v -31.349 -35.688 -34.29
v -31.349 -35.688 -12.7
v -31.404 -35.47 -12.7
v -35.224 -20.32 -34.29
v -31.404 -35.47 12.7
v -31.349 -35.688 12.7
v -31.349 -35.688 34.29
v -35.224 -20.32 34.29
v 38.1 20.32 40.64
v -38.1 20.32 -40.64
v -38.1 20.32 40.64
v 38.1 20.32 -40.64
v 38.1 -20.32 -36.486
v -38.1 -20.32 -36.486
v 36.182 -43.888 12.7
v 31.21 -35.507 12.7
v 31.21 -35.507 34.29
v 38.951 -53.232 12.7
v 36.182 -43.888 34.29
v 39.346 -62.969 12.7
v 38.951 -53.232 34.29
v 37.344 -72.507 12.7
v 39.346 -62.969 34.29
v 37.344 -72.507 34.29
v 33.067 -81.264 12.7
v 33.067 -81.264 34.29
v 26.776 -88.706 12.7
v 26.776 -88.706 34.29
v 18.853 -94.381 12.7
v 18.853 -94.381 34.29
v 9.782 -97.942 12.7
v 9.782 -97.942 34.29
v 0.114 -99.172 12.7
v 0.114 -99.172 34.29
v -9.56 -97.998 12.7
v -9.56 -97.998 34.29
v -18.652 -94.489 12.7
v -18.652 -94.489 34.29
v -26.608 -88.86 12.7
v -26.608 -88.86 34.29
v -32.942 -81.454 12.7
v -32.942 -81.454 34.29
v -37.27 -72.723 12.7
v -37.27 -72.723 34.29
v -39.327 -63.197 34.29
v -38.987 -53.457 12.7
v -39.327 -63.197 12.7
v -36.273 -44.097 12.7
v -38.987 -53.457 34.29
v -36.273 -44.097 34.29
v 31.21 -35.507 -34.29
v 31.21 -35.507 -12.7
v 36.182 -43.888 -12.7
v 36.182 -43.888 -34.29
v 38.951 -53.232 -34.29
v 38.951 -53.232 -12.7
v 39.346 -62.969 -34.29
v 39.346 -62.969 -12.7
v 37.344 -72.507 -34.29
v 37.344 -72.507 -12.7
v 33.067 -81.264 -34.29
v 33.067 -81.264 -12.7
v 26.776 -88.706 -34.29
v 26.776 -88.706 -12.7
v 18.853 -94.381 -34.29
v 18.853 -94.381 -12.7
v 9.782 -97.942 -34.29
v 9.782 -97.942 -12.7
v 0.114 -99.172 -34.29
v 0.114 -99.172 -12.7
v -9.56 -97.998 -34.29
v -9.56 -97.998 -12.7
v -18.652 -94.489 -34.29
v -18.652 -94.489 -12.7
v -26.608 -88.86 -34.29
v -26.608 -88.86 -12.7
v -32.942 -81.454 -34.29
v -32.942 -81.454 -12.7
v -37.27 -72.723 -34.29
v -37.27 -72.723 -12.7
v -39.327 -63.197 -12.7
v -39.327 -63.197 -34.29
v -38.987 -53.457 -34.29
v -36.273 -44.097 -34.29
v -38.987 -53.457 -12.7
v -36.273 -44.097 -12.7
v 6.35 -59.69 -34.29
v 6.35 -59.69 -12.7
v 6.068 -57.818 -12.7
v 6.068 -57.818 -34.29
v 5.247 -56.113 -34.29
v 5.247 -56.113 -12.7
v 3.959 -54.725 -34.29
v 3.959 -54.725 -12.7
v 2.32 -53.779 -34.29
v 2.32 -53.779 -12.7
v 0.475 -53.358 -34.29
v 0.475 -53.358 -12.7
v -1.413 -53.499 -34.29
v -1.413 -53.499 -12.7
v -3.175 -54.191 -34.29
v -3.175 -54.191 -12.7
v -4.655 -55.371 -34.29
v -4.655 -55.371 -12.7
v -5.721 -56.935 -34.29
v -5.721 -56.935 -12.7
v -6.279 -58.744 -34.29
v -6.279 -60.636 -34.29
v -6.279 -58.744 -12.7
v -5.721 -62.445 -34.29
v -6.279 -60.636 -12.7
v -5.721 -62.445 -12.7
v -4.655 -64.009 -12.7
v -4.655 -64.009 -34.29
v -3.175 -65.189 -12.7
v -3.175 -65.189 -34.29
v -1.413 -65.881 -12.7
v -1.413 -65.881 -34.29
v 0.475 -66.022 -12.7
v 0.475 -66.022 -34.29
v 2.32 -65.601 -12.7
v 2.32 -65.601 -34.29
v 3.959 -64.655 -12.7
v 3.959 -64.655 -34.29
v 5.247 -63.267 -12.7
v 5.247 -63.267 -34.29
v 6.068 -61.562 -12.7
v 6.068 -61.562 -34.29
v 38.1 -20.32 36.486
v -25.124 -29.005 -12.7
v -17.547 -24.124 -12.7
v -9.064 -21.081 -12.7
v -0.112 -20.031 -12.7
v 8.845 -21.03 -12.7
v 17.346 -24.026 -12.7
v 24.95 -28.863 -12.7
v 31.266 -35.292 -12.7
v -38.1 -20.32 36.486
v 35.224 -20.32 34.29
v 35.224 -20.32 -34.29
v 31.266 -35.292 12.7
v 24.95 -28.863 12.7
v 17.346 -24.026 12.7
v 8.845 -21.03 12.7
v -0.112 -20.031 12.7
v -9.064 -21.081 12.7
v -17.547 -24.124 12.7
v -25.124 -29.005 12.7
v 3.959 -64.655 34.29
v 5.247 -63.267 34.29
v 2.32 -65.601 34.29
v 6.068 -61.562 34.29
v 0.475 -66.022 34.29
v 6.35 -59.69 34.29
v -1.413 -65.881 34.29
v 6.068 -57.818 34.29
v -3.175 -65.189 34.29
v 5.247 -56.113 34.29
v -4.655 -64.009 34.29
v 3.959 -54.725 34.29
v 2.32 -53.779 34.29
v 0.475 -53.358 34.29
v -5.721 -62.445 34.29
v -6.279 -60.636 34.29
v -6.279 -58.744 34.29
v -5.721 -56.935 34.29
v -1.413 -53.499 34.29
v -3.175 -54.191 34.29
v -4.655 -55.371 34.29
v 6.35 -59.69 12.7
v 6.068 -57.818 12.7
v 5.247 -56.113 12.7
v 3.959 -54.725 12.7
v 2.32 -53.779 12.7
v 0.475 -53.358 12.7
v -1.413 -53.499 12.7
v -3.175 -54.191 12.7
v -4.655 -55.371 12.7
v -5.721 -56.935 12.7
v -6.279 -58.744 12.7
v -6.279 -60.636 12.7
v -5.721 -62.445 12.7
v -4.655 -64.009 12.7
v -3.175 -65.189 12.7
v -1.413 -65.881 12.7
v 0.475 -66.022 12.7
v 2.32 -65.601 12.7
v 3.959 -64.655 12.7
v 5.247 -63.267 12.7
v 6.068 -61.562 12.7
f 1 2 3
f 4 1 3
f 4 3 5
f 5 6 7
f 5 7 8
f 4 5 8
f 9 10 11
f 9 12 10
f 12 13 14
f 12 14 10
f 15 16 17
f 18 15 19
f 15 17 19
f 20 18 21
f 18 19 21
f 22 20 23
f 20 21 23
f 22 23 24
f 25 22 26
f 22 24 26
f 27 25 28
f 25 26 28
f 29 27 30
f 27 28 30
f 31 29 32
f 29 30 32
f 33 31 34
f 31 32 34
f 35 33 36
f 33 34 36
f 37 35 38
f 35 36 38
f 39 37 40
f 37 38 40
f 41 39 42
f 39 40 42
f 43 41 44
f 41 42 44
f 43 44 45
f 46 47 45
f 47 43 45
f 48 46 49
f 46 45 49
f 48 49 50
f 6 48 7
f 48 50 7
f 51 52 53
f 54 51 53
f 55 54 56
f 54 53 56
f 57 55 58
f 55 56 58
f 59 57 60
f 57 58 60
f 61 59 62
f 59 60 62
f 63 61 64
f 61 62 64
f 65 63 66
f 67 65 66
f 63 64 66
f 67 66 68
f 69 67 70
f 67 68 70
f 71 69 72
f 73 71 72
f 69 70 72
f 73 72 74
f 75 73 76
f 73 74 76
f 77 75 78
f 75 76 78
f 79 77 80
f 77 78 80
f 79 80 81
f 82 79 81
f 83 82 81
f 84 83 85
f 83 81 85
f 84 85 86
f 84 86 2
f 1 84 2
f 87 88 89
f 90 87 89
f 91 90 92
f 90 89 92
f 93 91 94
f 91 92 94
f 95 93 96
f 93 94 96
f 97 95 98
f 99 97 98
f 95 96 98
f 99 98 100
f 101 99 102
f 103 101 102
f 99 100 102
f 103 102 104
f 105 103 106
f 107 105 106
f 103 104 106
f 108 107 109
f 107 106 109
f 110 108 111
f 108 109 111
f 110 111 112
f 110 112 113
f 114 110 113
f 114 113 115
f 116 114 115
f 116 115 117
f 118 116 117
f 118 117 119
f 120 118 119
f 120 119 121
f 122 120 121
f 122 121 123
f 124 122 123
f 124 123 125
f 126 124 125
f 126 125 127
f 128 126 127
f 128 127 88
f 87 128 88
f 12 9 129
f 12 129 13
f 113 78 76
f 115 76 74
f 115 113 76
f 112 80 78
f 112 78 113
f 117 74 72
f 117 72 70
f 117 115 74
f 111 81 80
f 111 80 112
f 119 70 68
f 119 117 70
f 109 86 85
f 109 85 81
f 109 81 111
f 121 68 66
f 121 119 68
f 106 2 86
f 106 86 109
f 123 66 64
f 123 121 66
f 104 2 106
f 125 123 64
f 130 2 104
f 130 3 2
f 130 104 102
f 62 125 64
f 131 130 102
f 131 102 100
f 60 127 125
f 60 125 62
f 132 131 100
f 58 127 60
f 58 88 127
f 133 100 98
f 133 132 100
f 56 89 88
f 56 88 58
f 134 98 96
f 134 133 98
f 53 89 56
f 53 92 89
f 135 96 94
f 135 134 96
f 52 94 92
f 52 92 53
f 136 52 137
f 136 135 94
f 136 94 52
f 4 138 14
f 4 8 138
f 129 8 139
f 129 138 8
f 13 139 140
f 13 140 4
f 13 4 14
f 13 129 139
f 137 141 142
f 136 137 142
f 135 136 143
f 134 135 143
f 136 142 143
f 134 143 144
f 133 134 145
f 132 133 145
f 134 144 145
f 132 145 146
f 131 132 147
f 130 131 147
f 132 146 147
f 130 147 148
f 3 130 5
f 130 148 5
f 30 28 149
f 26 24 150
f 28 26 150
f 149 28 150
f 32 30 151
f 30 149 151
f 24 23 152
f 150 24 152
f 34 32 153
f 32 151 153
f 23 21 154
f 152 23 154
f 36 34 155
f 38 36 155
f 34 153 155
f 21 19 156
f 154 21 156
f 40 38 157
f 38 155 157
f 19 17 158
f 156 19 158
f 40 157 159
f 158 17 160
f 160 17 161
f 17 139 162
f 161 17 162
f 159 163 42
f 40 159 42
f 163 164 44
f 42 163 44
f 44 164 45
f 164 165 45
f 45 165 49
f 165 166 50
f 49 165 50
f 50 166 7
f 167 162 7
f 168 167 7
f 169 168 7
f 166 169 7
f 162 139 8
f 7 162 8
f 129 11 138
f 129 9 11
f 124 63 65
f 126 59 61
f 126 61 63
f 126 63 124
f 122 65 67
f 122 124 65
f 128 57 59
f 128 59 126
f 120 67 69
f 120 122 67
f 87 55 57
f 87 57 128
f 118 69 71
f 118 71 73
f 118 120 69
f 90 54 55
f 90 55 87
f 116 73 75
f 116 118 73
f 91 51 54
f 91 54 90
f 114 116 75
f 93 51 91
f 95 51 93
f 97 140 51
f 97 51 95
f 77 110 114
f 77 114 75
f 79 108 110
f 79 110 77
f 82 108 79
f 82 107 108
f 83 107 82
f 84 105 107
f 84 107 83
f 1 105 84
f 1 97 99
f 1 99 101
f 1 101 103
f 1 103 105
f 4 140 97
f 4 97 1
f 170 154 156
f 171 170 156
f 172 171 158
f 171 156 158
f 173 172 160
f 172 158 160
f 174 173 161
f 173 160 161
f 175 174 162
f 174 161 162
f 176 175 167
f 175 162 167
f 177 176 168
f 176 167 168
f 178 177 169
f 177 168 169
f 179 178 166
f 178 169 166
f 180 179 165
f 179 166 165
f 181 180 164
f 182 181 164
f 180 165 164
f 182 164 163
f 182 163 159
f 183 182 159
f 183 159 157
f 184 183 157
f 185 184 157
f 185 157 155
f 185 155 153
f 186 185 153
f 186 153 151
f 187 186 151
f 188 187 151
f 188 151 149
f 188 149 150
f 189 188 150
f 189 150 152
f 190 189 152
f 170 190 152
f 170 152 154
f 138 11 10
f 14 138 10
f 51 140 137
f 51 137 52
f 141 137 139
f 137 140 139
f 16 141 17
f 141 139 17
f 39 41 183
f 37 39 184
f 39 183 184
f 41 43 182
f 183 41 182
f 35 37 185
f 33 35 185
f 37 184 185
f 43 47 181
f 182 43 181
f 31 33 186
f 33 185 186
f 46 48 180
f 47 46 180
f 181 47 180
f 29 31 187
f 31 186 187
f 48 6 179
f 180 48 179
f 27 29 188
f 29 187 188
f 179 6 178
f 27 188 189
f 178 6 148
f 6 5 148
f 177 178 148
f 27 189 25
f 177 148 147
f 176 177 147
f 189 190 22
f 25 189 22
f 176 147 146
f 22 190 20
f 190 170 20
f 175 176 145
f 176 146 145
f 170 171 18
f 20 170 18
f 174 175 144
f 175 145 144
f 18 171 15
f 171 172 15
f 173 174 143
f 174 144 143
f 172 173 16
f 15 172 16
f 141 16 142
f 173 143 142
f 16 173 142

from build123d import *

# Parameters (mm, degrees)
SALIENTE_EXTRUIR1_DEPTH = 38.1
SALIENTE_EXTRUIR2_DEPTH = 34.29
CROQUIS3_R              = 39.658757808
CORTAR_EXTRUIR1_DEPTH   = 12.7
CROQUIS4_R              = 6.35
CORTAR_EXTRUIR2_DEPTH   = 131.416915542


with BuildPart() as part:
    # Croquis1 → Saliente-Extruir1 (new, symmetric)
    with BuildSketch(Plane(origin=(0, 0, 0), x_dir=(0, 0, -1), z_dir=(1, 0, 0))):
        Polygon((-40.64, 20.319999995), (-36.486122257, -20.319999995), (0, -20.319999995), (36.486122257, -20.319999995), (40.64, 20.319999995), align=None)
    extrude(amount=SALIENTE_EXTRUIR1_DEPTH, both=True)

    # Croquis2 → Saliente-Extruir2 (add, symmetric)
    with BuildSketch(Plane.XY):
        with BuildLine():
            Line((35.223664747, -20.319999995), (31.209635447, -35.506729715))
            ThreePointArc((31.209635447, -35.506729715), (0.114127167, -99.172386969), (-31.348920302, -35.687560492))
            Line((-31.348920302, -35.687560492), (-35.223664747, -20.319999995))
            Line((-35.223664747, -20.319999995), (35.223664747, -20.319999995))
        make_face()
    extrude(amount=SALIENTE_EXTRUIR2_DEPTH, both=True)

    # Croquis3 → Cortar-Extruir1 (cut, symmetric)
    with BuildSketch(Plane.XY):
        with Locations((0, -59.689999995)):
            Circle(CROQUIS3_R)
    extrude(amount=CORTAR_EXTRUIR1_DEPTH, both=True, mode=Mode.SUBTRACT)

    # Croquis4 → Cortar-Extruir2 (cut, through all)
    with BuildSketch(Plane.XY.offset(34.29)):
        with Locations((0, -59.689999995)):
            Circle(CROQUIS4_R)
    extrude(amount=-CORTAR_EXTRUIR2_DEPTH, mode=Mode.SUBTRACT)


solid = part.part
